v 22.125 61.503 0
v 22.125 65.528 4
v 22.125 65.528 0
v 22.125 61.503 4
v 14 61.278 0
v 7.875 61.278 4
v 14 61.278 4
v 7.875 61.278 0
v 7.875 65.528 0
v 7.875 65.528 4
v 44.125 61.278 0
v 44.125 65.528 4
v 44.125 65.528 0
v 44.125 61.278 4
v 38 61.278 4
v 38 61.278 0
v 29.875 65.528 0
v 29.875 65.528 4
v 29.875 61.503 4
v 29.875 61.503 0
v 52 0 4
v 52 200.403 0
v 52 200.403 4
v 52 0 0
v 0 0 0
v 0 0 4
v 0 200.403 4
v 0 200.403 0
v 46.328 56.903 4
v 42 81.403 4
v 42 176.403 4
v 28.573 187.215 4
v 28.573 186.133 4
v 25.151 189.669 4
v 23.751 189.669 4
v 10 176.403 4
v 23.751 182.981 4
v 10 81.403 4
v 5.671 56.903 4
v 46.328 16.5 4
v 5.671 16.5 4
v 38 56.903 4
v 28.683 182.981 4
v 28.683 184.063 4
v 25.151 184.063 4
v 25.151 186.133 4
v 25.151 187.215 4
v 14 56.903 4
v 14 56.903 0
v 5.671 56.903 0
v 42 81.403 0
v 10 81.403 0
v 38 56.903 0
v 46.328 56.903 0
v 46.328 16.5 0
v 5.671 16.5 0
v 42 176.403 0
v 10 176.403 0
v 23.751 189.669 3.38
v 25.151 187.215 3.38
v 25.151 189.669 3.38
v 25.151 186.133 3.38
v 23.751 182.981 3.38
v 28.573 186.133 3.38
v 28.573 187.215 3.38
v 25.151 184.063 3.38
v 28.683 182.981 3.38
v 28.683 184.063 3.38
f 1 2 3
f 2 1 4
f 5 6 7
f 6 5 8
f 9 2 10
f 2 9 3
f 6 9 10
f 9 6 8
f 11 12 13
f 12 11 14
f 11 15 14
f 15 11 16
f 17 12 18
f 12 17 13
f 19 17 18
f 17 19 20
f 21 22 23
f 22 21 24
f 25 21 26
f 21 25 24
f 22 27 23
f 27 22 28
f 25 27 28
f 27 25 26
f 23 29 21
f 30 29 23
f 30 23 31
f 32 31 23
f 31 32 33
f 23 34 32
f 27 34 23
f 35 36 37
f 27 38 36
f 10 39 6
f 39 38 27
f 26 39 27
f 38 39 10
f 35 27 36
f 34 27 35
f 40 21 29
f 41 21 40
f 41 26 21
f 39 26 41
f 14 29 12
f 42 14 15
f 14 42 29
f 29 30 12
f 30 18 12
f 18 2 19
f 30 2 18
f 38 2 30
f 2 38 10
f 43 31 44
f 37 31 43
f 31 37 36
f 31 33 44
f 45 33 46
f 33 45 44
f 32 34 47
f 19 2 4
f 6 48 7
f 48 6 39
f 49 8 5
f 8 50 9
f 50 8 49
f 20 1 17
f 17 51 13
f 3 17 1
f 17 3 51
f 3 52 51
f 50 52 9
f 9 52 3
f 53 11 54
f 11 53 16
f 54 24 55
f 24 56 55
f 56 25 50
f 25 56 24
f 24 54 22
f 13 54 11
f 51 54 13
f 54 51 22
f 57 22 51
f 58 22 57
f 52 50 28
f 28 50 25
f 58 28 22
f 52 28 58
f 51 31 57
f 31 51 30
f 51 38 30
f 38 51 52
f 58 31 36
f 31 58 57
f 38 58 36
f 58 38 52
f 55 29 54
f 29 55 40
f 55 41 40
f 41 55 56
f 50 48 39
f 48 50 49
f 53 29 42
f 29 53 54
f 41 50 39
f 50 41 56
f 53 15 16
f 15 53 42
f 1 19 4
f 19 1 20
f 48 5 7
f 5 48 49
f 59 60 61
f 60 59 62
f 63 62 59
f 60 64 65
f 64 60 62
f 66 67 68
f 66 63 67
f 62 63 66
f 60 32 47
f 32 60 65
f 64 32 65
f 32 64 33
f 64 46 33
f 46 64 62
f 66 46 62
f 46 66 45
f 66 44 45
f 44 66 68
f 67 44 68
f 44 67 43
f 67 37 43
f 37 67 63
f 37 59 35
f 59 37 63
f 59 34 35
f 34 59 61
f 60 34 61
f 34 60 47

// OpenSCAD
use <../../../tec_cold_block_mockup.scad>

support_driver_spine_export();
